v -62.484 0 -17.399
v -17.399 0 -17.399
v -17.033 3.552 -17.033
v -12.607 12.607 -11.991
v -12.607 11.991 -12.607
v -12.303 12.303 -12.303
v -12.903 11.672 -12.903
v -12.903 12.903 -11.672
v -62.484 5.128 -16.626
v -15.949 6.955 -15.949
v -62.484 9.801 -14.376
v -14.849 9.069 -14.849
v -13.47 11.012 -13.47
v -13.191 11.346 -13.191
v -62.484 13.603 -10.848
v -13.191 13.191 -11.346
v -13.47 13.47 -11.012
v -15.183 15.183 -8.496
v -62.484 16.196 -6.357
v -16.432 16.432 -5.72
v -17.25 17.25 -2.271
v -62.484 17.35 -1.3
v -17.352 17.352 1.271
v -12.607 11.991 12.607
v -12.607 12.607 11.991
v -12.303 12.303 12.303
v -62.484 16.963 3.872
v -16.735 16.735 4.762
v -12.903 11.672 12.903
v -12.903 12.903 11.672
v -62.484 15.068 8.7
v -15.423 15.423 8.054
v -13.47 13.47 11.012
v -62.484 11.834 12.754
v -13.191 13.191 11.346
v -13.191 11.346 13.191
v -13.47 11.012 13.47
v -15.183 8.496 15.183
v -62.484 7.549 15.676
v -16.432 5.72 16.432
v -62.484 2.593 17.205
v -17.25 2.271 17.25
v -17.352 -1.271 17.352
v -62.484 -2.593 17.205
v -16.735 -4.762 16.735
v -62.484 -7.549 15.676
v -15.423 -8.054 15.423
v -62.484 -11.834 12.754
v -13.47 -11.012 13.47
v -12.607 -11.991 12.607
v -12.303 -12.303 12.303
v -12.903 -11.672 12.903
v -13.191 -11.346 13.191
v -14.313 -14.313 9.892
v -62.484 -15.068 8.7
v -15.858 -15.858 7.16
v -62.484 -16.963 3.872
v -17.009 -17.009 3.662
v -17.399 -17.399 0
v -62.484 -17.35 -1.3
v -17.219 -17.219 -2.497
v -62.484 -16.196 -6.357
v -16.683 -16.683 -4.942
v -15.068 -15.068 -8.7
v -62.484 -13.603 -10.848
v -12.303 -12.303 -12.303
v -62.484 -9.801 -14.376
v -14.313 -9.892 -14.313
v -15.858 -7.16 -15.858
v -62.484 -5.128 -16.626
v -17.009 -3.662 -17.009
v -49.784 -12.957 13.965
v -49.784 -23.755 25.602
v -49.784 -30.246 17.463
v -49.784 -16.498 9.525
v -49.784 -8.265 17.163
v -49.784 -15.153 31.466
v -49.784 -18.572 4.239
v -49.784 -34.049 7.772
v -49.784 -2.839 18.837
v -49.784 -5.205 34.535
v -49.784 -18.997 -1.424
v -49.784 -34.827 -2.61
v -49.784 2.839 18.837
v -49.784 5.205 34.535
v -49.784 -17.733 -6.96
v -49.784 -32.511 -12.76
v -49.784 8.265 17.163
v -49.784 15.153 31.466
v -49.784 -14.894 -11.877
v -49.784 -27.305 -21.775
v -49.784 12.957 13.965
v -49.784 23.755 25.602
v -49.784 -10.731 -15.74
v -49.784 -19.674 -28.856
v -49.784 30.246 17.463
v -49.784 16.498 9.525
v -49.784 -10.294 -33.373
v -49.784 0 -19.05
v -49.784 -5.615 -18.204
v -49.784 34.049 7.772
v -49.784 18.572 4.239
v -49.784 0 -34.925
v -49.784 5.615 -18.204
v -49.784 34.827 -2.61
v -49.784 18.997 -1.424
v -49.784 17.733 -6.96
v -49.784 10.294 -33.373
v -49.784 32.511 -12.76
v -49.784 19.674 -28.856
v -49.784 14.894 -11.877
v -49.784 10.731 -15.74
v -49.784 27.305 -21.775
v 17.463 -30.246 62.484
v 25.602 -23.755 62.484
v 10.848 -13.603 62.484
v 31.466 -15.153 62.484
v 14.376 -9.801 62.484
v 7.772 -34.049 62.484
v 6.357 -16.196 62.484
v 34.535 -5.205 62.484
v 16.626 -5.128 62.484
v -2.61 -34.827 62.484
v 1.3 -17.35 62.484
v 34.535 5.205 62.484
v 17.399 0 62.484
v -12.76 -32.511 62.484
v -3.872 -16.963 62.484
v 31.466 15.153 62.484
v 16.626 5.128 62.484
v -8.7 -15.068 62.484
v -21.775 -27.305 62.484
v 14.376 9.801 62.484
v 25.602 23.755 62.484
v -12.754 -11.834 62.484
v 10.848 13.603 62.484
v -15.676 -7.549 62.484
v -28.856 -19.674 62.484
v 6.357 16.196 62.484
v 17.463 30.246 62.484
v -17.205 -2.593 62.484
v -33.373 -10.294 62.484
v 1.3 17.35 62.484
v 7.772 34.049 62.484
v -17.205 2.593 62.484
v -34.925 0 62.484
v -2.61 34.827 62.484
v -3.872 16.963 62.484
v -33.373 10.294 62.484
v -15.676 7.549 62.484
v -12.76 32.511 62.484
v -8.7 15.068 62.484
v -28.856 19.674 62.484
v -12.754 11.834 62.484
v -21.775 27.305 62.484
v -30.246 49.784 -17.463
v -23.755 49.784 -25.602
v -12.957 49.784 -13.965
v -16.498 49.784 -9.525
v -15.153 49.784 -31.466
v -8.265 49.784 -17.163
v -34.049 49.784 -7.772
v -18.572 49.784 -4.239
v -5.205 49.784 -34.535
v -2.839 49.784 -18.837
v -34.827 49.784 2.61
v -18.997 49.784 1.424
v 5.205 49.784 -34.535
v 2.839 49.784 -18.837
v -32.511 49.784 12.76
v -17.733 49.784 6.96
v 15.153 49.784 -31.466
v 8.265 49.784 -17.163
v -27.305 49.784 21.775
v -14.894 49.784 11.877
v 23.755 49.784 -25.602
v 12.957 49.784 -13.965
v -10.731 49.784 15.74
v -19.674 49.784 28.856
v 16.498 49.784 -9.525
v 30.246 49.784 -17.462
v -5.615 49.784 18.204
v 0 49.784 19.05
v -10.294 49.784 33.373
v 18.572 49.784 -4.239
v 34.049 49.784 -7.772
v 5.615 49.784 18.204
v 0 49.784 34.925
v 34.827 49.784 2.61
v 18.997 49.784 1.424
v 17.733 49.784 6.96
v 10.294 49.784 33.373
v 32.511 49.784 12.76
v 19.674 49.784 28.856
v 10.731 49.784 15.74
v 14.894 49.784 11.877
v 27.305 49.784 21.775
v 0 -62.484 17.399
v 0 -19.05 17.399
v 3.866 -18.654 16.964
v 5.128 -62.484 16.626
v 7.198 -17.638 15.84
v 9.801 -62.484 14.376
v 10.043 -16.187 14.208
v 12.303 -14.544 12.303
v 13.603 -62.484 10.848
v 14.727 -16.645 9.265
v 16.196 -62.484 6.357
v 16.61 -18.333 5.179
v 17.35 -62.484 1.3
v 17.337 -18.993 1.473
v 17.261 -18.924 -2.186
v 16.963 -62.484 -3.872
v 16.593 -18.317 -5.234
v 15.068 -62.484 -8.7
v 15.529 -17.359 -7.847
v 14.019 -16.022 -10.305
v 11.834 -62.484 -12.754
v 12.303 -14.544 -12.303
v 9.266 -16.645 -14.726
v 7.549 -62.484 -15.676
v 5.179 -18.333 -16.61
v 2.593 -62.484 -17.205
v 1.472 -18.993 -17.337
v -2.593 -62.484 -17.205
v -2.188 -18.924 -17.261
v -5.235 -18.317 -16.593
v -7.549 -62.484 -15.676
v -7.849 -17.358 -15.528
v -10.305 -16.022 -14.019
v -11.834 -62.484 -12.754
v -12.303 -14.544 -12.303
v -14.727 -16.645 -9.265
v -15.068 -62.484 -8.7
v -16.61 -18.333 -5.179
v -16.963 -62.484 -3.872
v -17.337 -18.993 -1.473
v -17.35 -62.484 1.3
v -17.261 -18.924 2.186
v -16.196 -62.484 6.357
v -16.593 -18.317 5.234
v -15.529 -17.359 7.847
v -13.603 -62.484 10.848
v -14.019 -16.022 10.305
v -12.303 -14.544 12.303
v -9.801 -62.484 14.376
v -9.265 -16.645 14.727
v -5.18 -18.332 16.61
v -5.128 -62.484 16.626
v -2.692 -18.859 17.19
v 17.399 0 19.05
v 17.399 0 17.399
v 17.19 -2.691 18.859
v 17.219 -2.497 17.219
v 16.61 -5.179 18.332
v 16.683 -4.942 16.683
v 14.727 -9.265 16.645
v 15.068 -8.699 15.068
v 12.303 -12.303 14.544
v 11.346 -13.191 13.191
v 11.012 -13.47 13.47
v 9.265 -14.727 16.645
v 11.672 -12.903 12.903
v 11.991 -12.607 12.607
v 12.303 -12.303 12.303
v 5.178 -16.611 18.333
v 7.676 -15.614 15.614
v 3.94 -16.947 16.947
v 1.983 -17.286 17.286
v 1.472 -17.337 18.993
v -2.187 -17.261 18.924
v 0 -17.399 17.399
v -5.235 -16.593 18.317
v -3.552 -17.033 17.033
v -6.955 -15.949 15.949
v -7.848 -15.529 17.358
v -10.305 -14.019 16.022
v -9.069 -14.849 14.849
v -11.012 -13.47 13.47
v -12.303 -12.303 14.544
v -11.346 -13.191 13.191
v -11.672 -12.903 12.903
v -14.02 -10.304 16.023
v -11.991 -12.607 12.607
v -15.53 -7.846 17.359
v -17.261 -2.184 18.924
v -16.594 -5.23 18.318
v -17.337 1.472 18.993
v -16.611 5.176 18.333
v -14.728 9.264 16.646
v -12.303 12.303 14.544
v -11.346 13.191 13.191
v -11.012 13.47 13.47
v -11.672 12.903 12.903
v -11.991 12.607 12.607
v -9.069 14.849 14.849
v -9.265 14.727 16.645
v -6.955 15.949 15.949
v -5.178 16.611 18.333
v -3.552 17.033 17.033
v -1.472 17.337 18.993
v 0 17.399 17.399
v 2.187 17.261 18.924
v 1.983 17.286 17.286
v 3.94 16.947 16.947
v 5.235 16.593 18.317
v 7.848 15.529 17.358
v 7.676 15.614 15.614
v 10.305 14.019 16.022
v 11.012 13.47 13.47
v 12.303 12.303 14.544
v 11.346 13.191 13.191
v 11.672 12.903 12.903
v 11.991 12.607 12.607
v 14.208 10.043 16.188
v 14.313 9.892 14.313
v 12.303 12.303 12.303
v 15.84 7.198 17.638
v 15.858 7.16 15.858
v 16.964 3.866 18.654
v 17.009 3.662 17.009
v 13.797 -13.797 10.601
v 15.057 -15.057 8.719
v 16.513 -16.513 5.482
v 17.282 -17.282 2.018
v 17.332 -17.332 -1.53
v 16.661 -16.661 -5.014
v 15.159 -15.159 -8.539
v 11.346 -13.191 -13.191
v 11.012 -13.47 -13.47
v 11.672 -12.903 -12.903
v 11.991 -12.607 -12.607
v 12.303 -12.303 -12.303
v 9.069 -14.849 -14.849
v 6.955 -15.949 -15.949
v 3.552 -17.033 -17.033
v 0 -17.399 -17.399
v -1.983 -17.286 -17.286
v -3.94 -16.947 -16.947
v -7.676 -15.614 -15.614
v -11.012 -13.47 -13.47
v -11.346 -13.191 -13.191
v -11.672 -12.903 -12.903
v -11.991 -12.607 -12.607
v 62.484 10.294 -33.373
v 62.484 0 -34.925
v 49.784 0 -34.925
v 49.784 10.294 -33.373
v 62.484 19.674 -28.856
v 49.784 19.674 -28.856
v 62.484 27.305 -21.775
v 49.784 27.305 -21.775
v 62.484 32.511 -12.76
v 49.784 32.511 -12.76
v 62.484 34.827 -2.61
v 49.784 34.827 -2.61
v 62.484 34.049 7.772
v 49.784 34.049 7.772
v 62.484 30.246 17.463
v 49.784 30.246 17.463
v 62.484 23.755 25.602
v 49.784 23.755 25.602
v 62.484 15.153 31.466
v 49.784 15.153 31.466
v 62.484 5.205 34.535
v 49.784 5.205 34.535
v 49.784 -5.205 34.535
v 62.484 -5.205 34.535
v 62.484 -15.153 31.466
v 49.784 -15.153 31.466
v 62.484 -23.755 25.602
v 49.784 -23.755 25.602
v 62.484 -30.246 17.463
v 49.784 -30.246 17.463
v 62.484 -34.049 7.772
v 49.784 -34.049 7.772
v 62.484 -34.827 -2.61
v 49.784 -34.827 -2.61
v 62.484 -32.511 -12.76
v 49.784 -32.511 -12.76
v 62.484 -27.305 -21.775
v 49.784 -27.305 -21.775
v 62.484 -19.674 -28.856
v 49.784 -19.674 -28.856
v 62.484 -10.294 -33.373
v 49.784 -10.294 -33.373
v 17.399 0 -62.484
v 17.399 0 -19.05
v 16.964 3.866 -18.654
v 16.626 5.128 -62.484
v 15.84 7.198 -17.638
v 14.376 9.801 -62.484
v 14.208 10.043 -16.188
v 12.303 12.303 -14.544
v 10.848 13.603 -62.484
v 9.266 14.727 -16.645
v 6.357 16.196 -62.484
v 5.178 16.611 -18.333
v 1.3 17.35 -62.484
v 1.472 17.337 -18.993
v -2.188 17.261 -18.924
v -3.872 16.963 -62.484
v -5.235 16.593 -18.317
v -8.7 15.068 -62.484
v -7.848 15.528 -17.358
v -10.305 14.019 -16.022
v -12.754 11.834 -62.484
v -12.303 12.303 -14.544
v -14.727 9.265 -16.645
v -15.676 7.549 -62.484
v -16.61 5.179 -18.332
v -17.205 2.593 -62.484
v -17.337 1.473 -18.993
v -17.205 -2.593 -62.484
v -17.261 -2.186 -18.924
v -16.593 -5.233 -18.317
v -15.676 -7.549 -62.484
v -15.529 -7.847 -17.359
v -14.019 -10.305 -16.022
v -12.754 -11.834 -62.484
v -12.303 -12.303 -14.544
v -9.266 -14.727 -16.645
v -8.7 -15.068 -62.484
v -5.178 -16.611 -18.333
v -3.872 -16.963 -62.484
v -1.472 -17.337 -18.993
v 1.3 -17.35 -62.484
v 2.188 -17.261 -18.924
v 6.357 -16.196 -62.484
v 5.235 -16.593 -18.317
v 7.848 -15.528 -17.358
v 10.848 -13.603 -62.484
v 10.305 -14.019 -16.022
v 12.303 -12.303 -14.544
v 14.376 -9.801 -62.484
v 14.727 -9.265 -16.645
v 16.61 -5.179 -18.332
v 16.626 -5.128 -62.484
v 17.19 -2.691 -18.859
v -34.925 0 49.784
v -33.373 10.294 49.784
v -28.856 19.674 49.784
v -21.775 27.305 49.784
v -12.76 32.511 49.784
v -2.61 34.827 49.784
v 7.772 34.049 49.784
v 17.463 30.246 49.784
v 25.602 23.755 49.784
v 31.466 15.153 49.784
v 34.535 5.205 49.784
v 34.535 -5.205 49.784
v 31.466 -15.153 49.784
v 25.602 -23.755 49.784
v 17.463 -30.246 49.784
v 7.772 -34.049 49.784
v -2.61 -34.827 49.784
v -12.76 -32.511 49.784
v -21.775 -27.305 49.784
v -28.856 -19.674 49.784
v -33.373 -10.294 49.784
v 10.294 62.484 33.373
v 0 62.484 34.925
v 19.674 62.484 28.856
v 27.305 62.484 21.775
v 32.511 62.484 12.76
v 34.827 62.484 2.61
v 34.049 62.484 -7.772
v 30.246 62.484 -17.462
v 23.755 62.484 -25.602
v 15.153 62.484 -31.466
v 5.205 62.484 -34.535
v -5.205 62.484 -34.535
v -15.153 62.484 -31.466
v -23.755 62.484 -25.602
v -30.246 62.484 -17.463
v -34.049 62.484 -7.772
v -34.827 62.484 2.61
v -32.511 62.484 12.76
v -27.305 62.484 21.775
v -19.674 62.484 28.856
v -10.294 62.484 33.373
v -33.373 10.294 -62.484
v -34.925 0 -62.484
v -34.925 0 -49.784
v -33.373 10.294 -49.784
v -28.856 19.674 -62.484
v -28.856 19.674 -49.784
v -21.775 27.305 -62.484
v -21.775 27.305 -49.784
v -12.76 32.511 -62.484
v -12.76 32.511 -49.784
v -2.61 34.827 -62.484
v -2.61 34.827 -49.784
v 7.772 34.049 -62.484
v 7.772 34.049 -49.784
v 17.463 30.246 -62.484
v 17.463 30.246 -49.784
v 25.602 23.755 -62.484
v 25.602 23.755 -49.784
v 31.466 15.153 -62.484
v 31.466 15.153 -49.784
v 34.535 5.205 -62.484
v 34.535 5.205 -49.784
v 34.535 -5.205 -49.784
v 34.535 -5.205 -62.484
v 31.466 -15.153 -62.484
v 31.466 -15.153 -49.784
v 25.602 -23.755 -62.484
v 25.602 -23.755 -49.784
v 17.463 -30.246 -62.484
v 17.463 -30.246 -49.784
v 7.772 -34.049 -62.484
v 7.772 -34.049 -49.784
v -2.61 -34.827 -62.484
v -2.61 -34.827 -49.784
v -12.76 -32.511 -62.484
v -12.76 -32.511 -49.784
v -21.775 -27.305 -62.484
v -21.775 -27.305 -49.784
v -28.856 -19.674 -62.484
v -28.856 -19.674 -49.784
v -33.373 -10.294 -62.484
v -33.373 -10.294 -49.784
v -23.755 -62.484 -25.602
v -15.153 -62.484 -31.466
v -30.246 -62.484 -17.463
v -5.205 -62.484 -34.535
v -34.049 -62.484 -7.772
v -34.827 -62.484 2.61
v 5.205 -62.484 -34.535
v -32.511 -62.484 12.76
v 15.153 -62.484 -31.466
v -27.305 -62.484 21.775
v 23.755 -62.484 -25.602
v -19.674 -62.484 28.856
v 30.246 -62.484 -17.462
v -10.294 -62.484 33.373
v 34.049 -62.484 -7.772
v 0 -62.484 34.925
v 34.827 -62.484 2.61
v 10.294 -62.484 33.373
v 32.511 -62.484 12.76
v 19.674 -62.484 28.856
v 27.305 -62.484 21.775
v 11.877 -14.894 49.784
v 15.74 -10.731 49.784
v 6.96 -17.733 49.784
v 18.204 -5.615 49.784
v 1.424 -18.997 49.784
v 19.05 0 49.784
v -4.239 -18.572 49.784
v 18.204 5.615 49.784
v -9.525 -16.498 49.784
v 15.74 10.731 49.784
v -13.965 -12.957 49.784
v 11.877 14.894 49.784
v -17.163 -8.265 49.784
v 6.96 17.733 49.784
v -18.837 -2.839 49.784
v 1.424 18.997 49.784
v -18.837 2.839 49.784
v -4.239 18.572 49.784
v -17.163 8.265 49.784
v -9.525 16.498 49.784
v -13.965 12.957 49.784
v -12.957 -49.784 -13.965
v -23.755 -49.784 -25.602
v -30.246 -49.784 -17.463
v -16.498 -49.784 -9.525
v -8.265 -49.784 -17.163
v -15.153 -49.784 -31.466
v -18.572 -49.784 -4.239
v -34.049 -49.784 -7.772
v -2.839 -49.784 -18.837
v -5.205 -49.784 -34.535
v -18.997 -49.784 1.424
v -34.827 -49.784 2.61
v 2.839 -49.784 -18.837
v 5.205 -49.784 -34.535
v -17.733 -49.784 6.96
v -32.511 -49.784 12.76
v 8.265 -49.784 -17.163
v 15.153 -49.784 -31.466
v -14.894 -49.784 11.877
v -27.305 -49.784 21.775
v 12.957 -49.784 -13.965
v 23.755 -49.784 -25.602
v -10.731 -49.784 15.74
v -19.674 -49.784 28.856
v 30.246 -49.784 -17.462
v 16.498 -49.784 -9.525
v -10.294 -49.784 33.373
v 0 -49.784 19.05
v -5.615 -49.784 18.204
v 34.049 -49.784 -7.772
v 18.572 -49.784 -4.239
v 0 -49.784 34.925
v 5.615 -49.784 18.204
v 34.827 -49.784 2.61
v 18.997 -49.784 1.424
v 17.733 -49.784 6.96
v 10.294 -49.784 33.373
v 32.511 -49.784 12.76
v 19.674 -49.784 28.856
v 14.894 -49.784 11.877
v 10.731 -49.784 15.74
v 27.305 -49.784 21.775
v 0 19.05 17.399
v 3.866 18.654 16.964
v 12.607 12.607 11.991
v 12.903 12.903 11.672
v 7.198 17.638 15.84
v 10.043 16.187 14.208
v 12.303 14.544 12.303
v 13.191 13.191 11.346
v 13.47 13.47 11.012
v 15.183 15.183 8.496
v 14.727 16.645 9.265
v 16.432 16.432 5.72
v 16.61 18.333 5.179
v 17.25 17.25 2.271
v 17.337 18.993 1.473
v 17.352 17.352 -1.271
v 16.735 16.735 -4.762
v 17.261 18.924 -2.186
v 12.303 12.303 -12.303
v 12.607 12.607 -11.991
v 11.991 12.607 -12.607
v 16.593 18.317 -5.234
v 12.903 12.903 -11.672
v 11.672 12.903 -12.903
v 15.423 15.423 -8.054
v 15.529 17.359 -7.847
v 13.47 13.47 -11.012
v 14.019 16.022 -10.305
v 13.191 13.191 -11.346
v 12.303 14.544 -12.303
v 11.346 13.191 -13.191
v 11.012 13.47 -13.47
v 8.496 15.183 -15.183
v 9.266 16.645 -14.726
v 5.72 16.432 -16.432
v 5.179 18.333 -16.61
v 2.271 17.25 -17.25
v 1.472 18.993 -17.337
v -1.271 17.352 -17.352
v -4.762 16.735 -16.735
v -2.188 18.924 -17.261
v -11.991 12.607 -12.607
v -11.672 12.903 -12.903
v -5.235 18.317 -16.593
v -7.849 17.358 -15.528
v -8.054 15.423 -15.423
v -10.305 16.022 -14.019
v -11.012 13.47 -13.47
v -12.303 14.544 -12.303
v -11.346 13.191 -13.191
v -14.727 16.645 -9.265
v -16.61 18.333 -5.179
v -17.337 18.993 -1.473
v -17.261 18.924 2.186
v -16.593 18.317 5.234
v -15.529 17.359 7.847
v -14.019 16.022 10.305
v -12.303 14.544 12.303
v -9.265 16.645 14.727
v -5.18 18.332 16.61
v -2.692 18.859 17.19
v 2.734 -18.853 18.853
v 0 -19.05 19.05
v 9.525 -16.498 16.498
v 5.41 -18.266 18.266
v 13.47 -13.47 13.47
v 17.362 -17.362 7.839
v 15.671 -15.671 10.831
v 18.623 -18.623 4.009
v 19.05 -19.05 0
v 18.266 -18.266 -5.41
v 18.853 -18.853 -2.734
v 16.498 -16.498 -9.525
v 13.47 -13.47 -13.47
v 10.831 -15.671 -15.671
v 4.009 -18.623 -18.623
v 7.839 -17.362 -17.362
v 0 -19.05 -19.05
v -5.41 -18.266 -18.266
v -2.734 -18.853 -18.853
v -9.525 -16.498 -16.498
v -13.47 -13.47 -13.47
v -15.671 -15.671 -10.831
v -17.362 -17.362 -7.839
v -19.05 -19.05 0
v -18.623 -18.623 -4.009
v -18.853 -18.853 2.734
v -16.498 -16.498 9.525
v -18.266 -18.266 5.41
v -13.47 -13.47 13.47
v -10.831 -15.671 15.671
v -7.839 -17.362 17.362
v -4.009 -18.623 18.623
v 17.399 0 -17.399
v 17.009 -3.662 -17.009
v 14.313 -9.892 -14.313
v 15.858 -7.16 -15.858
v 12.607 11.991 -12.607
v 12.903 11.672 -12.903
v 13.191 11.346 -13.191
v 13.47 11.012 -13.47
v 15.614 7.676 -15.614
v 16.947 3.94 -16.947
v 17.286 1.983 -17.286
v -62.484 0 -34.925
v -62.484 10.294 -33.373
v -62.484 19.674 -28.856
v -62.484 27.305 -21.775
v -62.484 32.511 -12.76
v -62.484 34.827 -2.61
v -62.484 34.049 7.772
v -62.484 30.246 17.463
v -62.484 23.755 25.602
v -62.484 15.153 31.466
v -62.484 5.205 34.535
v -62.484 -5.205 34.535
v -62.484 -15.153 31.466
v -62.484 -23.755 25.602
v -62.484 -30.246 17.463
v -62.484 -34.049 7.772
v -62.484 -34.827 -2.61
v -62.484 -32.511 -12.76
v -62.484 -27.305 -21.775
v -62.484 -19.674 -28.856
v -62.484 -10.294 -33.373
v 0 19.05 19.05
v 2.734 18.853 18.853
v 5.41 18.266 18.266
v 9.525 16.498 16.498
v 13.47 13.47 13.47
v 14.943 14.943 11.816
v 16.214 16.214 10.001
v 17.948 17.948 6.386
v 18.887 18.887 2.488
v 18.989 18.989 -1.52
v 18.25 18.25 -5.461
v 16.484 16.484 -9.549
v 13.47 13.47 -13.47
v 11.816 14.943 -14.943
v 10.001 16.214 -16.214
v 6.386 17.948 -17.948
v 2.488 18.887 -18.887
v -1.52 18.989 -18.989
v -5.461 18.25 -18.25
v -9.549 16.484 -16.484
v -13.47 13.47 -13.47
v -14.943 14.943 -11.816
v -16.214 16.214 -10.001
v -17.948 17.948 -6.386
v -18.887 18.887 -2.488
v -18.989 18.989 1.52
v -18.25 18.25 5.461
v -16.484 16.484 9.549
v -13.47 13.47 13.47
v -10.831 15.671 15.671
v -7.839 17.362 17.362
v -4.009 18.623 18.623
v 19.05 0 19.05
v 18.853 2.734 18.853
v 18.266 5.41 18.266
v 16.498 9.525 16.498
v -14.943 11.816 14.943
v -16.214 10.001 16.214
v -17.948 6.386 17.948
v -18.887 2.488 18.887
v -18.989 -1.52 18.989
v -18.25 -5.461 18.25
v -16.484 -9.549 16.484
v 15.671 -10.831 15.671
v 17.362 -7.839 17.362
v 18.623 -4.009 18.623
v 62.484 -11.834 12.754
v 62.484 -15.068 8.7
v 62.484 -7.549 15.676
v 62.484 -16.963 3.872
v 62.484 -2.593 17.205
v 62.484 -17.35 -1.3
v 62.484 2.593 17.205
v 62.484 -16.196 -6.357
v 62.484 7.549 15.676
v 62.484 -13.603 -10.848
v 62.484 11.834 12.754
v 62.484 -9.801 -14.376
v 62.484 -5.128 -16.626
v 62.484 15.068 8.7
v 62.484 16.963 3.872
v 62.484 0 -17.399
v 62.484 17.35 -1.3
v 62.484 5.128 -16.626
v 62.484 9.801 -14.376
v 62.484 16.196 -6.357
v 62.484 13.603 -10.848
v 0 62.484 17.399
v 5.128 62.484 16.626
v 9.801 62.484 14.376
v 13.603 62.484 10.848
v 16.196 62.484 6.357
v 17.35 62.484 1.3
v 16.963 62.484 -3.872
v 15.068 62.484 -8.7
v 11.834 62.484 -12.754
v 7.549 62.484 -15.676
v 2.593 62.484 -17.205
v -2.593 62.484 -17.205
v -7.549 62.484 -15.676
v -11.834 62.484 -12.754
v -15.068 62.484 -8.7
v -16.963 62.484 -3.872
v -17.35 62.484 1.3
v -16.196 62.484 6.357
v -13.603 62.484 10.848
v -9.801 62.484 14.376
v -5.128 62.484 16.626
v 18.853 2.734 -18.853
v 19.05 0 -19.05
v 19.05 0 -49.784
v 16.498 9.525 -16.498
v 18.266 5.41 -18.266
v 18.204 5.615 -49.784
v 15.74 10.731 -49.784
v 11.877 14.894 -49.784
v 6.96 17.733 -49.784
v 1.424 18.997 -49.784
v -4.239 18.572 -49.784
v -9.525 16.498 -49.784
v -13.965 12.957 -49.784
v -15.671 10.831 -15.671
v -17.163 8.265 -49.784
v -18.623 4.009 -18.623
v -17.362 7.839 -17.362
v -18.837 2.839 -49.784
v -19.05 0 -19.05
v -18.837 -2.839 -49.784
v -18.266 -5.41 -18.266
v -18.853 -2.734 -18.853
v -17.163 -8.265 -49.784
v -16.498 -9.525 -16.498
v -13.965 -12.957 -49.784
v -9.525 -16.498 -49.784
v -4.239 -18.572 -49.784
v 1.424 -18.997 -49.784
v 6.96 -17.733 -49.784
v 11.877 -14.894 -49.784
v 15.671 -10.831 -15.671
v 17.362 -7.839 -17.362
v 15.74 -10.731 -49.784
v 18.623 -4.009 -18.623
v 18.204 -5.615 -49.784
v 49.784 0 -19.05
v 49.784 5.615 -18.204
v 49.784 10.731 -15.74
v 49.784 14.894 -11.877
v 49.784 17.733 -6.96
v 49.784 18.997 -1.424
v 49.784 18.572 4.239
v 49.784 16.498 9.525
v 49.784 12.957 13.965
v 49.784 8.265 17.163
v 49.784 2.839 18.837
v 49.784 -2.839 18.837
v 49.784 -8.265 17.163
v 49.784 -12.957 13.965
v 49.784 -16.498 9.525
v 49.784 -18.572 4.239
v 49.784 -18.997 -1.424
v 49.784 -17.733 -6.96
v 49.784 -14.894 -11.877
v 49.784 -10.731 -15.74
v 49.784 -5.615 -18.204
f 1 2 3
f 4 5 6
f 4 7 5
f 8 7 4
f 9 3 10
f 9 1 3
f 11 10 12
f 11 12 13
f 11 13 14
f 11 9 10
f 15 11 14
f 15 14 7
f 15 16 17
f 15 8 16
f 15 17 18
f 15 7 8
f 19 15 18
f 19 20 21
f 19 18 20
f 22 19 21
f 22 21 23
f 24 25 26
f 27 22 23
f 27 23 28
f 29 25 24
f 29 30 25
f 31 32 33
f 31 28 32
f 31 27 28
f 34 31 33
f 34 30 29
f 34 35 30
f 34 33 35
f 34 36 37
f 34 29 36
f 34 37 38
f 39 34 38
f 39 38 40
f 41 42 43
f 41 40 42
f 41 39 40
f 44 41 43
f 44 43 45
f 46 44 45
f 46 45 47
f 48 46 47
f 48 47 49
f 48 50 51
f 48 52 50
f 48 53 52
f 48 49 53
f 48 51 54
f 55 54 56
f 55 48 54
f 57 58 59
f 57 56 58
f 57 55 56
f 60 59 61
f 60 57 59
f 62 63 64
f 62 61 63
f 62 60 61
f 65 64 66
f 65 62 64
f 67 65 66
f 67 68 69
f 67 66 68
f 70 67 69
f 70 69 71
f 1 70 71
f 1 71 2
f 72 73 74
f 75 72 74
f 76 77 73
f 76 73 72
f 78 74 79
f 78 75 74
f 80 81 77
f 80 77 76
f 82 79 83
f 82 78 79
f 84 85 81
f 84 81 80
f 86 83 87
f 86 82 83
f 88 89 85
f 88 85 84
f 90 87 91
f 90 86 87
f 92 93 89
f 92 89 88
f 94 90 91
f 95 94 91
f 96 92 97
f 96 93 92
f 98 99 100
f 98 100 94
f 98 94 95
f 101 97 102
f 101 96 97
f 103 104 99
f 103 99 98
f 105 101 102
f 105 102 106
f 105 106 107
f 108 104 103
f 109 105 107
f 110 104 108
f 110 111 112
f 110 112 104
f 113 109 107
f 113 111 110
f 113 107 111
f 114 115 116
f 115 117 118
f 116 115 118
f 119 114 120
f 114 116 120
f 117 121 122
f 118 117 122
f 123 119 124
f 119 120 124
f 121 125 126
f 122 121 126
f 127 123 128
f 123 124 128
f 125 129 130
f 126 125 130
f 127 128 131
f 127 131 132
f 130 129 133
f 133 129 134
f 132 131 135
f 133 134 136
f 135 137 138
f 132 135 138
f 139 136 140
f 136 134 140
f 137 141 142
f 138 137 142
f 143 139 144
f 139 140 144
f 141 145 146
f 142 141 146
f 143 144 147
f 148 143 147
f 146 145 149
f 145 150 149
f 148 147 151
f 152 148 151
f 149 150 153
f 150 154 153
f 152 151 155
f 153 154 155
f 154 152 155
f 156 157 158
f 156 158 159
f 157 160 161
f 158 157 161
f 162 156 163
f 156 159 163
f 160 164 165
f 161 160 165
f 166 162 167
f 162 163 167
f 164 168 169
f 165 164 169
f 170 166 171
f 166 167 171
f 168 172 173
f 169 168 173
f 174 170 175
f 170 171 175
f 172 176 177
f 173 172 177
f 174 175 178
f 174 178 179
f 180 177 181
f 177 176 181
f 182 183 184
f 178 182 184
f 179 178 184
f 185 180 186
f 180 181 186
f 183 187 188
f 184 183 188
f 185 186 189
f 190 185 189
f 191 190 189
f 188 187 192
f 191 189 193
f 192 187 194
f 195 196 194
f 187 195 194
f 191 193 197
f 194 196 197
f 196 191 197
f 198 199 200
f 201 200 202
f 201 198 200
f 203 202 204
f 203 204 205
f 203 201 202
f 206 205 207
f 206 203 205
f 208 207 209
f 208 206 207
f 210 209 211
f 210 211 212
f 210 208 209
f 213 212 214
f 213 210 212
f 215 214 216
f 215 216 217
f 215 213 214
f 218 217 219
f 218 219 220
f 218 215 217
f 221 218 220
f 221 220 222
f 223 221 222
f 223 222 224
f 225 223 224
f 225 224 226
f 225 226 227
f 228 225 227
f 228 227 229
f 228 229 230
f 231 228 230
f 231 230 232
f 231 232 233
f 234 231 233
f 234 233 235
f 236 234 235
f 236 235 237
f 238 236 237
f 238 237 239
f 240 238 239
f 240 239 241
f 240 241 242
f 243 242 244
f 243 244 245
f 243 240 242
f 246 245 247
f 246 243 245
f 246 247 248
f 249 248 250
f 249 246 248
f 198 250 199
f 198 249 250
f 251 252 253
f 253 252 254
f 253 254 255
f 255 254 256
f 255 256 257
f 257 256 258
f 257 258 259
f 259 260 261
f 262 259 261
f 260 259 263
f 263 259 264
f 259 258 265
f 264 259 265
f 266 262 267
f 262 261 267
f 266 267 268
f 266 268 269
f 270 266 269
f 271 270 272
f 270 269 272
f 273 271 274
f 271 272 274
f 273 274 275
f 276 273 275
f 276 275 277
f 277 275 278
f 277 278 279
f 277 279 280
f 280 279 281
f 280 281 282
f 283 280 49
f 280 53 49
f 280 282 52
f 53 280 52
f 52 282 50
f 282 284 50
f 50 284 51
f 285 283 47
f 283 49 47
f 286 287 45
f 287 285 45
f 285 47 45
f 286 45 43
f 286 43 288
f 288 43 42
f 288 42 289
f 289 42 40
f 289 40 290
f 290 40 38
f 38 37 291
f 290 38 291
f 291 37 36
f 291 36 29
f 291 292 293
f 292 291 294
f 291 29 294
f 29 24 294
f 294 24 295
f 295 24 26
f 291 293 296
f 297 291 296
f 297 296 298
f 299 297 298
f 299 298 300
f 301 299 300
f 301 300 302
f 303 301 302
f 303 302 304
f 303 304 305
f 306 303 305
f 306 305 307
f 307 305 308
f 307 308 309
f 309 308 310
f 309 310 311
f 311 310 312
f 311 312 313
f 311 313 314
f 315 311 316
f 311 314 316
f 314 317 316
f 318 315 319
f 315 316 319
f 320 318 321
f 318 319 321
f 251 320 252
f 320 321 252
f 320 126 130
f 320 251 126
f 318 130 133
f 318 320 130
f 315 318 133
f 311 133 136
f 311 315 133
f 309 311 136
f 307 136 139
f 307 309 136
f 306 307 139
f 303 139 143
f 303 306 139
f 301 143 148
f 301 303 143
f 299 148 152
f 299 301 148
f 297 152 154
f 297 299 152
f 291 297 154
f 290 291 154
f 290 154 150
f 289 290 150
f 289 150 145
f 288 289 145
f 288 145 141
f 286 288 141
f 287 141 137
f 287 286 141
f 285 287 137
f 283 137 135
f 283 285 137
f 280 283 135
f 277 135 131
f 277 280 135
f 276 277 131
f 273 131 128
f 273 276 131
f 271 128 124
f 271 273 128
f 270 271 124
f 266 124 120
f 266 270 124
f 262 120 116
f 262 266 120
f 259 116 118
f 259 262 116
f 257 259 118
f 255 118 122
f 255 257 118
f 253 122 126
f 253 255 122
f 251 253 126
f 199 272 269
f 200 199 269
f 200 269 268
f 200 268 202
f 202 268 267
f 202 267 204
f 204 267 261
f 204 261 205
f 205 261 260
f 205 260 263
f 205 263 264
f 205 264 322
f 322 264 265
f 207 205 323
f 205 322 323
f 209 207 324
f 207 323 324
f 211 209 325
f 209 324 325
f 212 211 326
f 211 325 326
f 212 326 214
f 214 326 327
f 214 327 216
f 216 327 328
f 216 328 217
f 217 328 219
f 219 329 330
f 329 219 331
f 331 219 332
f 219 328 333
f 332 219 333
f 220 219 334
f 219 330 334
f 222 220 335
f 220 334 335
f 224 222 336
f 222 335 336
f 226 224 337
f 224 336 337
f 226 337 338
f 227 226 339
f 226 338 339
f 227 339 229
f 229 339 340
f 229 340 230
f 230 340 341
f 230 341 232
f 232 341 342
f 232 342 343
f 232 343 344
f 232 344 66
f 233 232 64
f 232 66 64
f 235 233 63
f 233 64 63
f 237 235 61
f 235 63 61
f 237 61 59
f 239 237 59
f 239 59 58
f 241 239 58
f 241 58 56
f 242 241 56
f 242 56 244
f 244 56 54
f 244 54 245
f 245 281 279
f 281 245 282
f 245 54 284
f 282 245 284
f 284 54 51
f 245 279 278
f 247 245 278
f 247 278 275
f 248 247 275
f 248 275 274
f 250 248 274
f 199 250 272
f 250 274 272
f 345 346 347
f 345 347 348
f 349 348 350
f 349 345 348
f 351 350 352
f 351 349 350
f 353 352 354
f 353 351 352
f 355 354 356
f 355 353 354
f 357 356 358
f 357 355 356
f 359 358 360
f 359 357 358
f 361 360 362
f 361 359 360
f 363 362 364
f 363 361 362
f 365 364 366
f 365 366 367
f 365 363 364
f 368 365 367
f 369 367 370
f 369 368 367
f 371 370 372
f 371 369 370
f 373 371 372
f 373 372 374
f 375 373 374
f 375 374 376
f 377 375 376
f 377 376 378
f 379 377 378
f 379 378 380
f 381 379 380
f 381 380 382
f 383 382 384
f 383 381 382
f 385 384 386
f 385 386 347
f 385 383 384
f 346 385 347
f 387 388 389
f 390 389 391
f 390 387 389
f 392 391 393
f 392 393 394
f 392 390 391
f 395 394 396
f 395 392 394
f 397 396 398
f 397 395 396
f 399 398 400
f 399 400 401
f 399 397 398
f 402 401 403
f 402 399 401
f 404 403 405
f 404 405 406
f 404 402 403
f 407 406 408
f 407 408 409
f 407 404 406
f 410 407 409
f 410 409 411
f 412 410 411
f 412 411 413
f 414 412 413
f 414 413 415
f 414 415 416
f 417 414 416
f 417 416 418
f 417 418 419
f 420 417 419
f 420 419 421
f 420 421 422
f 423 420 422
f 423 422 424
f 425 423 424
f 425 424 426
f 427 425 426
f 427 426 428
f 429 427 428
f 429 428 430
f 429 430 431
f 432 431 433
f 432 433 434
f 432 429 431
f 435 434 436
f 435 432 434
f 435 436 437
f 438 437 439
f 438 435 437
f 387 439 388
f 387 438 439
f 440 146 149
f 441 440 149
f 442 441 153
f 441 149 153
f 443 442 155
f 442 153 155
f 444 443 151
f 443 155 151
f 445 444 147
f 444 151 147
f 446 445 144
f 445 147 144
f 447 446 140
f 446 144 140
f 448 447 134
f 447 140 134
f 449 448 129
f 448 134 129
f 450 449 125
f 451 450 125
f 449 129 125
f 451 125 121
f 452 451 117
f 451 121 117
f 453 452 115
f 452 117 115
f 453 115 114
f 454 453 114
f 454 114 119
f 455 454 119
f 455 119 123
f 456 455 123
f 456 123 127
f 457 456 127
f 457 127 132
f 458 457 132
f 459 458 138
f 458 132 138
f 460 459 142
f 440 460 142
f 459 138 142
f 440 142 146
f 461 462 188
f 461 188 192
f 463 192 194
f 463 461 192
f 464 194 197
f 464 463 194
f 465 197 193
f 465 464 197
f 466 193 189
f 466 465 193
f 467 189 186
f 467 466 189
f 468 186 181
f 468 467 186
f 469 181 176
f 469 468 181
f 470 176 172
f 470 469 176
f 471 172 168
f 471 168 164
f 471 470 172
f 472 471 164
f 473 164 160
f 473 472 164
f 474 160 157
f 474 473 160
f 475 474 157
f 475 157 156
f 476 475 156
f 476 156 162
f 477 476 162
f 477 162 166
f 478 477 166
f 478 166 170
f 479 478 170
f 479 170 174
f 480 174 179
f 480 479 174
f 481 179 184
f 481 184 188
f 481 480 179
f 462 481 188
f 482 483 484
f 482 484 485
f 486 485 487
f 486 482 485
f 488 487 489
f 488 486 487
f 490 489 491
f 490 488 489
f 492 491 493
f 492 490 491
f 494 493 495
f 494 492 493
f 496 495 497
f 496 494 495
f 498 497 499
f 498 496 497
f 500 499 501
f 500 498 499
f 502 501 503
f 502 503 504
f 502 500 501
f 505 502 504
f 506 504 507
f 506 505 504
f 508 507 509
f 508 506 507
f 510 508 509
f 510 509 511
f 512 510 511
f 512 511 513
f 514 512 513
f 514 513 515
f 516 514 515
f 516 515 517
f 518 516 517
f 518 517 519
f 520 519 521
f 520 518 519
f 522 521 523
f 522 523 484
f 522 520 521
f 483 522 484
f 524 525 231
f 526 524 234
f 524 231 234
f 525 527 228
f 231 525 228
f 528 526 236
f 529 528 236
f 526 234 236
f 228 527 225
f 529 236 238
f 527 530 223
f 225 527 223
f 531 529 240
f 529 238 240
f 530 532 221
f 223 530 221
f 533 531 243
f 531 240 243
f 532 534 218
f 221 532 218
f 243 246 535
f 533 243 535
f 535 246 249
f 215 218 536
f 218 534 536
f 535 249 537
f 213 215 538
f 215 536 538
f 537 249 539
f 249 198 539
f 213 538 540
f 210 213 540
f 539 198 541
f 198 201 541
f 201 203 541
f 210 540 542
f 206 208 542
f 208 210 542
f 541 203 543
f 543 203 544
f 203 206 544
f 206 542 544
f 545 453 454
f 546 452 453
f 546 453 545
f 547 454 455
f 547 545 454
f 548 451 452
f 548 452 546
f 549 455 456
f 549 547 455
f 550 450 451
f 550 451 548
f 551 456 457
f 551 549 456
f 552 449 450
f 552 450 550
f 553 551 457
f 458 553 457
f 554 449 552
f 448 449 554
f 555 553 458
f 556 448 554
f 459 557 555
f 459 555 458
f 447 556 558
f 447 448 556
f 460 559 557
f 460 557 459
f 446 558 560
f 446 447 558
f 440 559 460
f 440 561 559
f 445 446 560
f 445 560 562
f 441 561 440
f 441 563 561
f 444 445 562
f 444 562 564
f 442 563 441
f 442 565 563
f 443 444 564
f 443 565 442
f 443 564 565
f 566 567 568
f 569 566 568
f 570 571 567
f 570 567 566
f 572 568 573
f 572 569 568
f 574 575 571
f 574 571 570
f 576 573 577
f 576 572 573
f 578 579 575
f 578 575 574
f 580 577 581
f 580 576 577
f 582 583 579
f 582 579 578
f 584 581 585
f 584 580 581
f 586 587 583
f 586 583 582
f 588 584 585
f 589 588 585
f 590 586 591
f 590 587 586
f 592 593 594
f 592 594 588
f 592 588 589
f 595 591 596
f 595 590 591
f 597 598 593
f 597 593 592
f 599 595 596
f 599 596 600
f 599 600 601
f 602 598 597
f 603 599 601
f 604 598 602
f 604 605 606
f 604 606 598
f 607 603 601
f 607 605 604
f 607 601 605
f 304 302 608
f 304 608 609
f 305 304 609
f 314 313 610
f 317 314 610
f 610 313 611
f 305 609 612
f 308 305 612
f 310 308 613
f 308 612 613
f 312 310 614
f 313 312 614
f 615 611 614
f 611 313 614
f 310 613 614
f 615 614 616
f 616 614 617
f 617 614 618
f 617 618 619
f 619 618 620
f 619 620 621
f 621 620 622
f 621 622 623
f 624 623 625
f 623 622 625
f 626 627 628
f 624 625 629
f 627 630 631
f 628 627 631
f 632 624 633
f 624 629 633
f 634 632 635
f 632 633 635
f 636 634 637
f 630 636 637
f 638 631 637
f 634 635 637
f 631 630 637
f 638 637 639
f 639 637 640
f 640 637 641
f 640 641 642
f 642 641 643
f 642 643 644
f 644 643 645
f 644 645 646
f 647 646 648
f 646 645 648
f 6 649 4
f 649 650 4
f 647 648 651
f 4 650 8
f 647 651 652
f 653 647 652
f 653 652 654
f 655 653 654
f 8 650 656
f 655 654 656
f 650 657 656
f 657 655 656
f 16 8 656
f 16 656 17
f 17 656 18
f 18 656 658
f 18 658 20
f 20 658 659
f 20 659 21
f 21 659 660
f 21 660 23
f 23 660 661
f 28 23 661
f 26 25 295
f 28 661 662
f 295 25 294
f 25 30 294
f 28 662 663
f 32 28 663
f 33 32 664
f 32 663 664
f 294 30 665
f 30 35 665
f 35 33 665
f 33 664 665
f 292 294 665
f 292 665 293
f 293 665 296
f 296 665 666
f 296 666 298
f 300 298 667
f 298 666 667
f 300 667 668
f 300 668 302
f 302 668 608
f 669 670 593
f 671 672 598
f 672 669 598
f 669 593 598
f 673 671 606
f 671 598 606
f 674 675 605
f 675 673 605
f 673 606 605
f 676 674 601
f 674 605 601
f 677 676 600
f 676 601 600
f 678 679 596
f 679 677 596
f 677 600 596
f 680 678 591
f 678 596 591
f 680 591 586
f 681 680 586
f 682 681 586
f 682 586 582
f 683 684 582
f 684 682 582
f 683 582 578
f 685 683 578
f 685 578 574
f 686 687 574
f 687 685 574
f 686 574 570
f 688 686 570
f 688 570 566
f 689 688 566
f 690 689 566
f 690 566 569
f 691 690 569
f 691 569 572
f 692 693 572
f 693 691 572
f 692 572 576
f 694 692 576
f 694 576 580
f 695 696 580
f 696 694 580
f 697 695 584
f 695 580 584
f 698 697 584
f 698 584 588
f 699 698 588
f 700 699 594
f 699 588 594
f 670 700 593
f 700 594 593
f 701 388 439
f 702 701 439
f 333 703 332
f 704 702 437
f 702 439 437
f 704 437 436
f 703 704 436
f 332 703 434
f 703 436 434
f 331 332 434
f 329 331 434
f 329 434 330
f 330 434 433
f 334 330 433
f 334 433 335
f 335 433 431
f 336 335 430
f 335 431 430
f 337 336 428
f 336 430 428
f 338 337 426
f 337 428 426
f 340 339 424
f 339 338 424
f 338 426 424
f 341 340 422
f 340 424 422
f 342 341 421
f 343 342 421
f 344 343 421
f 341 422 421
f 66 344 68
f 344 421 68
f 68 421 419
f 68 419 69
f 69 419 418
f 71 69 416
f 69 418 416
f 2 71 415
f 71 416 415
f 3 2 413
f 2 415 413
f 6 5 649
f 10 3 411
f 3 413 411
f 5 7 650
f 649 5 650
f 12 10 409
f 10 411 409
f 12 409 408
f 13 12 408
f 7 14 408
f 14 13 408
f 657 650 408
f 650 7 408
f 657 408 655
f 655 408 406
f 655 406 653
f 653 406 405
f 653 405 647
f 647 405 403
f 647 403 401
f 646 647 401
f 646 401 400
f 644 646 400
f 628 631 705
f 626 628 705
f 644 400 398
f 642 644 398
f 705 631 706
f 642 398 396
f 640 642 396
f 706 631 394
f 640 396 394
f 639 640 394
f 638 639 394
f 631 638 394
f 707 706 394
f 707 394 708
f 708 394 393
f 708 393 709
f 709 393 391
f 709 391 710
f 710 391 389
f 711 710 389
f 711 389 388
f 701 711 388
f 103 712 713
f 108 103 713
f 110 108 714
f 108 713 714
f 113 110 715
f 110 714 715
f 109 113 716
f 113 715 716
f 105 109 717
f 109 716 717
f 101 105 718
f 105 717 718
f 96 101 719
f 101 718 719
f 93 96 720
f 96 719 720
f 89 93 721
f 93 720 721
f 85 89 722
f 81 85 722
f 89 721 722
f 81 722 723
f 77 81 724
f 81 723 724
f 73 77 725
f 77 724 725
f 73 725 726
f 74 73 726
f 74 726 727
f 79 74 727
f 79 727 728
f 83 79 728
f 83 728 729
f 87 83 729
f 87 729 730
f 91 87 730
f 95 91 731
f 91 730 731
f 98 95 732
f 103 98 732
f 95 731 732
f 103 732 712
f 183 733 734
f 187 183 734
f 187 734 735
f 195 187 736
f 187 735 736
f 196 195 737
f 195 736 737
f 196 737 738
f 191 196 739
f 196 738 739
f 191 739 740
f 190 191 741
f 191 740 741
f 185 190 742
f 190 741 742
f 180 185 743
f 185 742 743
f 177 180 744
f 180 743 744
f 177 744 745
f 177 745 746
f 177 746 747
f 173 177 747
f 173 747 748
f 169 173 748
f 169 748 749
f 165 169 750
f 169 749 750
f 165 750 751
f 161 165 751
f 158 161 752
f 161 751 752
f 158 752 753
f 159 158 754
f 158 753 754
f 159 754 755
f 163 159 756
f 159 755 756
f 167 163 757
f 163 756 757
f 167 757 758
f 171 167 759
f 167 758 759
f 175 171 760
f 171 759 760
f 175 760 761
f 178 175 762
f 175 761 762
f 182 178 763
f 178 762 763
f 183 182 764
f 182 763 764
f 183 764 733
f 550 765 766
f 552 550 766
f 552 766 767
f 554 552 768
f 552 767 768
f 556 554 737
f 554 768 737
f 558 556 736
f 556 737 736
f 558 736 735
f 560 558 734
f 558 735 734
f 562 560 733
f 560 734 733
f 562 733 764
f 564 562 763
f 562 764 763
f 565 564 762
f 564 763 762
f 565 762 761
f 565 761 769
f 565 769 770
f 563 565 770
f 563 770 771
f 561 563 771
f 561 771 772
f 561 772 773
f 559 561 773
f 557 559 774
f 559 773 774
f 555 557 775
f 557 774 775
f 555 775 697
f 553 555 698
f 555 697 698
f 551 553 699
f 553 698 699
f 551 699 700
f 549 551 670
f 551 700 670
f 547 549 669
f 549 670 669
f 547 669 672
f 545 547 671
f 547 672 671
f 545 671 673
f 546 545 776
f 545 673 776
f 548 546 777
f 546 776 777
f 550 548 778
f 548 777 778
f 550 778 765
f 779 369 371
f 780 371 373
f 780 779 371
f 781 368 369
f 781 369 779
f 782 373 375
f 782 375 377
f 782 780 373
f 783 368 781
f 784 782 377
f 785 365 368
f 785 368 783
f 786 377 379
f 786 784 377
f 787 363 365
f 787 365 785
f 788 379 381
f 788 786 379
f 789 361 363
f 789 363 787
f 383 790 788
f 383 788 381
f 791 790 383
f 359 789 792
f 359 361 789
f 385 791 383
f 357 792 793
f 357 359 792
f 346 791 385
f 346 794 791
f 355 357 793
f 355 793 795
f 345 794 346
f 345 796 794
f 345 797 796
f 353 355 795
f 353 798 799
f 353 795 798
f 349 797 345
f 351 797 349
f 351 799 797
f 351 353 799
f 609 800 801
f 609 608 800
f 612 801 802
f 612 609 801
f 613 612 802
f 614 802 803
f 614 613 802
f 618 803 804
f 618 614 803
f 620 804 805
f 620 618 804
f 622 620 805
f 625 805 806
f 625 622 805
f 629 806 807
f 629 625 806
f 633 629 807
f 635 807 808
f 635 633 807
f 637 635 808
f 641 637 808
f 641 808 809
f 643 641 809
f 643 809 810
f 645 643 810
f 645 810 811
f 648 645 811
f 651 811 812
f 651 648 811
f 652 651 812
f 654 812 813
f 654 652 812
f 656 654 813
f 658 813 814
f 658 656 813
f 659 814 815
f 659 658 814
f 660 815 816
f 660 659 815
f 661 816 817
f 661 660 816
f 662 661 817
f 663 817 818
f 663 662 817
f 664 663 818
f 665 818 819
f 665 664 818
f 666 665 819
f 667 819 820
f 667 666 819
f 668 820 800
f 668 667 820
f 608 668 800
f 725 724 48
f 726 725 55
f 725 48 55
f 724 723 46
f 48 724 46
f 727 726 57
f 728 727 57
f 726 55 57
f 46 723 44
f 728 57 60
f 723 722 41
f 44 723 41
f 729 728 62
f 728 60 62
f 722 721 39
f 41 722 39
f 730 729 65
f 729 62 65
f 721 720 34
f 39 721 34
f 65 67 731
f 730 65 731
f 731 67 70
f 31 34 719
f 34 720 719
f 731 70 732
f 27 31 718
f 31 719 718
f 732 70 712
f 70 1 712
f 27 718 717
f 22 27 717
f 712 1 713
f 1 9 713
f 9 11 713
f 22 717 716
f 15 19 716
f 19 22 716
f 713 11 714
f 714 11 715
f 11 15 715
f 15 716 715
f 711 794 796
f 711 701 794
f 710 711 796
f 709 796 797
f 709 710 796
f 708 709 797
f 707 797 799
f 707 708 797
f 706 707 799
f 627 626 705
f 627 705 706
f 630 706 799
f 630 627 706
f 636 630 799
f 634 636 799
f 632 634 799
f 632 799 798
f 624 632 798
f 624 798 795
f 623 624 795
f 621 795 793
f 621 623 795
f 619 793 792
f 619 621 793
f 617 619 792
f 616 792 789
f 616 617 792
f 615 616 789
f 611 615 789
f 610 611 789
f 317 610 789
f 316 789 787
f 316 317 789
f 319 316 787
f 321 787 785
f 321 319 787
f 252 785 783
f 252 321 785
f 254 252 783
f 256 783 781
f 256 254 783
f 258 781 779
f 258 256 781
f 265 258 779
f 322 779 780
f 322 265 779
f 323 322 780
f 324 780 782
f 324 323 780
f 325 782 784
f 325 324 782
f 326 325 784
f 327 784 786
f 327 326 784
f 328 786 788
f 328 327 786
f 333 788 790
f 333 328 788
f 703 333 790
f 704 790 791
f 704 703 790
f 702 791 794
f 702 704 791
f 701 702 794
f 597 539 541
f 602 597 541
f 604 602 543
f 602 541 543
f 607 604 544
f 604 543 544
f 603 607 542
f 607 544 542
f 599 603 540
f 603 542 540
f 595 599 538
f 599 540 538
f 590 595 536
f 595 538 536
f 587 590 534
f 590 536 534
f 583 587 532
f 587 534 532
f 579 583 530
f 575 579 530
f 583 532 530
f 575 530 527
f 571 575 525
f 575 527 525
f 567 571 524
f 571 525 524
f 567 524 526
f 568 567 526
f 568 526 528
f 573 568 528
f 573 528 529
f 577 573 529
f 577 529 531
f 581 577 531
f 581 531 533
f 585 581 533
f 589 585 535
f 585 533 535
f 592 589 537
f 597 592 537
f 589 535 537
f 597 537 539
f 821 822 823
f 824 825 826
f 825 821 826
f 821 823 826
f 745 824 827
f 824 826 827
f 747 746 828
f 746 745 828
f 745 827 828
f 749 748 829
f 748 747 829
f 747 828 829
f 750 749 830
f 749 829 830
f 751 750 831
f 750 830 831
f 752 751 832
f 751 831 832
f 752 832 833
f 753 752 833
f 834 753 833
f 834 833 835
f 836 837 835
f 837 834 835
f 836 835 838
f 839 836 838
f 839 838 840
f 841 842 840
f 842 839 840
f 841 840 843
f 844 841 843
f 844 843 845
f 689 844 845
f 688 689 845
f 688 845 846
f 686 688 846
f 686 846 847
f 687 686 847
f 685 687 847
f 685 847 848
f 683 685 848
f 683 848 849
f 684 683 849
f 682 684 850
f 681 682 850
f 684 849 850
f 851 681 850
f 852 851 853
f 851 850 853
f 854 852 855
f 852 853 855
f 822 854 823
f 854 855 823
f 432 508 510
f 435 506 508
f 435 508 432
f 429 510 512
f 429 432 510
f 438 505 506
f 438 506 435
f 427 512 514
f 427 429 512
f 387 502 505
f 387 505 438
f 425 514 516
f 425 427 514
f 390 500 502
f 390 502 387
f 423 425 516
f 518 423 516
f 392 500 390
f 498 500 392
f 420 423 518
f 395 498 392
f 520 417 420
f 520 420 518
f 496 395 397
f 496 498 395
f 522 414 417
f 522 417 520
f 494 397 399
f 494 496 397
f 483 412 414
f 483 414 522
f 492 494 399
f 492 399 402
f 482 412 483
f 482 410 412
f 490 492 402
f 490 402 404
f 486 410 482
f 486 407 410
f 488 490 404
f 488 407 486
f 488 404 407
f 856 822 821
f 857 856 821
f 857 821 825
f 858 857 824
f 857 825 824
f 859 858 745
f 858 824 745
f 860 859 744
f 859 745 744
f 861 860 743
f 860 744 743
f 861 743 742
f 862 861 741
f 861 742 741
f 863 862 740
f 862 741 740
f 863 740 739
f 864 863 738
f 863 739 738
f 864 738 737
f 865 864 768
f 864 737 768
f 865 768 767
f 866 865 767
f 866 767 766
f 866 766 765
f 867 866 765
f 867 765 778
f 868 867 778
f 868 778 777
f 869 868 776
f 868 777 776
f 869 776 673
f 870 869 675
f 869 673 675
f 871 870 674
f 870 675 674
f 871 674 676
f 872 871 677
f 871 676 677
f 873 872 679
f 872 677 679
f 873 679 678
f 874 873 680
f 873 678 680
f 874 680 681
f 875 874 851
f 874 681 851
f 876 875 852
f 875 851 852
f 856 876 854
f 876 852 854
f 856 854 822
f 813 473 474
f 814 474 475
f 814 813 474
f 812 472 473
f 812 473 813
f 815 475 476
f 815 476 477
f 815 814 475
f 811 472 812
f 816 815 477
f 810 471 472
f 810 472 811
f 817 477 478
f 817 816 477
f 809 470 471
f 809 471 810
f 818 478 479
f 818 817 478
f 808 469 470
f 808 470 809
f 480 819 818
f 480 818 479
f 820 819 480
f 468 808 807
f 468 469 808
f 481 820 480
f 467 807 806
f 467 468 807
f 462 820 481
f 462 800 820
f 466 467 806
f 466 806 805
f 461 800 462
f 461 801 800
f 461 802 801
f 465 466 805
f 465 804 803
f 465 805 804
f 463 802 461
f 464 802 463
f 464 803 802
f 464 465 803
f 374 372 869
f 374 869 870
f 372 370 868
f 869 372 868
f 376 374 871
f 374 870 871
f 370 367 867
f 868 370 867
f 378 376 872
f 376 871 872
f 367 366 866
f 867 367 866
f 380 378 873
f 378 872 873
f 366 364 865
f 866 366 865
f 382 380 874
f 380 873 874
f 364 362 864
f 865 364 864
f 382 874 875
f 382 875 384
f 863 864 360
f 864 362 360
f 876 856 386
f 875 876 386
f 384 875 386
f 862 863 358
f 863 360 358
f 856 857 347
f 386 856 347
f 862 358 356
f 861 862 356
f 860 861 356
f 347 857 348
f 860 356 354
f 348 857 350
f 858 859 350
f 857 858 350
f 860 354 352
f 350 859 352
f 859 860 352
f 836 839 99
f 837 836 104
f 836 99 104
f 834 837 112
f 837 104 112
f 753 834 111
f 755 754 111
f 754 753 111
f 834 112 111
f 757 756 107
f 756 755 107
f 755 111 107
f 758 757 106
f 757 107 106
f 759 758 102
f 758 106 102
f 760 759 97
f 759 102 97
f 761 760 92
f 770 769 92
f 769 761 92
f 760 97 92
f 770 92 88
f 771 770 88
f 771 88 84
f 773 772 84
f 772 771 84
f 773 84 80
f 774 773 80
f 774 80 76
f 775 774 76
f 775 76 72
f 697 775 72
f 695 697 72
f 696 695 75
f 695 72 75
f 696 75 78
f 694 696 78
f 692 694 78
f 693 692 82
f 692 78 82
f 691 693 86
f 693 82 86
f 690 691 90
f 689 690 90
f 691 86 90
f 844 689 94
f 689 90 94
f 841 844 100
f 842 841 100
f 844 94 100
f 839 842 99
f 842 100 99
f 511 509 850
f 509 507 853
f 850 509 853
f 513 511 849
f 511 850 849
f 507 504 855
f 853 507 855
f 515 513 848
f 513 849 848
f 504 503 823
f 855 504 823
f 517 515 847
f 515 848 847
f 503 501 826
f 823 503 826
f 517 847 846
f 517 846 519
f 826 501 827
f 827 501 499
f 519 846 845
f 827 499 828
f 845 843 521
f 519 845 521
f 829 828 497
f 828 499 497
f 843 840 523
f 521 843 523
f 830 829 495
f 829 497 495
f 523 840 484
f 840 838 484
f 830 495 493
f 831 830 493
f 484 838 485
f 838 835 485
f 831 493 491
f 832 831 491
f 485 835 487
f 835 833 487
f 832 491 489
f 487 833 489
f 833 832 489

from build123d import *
from build123d.topology import SkipClean

# Parameters (mm, degrees)
EXTRUDE1_DEPTH      = 62.484
EXTRUDE1_DEPTH_BACK = 62.484
SKETCH1_R           = 19.05
SKETCH1_R_2         = 17.399
EXTRUDE2_DEPTH      = 62.484
EXTRUDE2_DEPTH_BACK = 62.484
SKETCH2_R           = 19.05
SKETCH2_R_2         = 17.399
EXTRUDE3_DEPTH      = 62.484
EXTRUDE3_DEPTH_BACK = 62.484
SKETCH3_R           = 19.05
SKETCH3_R_2         = 17.399
EXTRUDE4_START      = -81.534000101
EXTRUDE4_OUTLINE_R  = 17.399
EXTRUDE4_DEPTH      = 38.100000201
SKETCH5_R           = 17.399
EXTRUDE5_DEPTH      = 154.053917211
SKETCH6_R           = 17.399
EXTRUDE6_DEPTH      = 154.053917211
SKETCH7_R           = 34.925
SKETCH7_R_2         = 17.399
EXTRUDE7_DEPTH      = 12.7
SKETCH8_R           = 34.925
SKETCH8_R_2         = 17.399
EXTRUDE8_DEPTH      = 12.7
SKETCH9_R           = 34.925
SKETCH9_R_2         = 17.399
EXTRUDE9_DEPTH      = 12.7


# Read off the part's stored shape, not the designer's step: Extrude4
with BuildPart() as part:
    # Sketch1 → Extrude1 (new, two sides: drawn at the far end of the back side and taken through both)
    with BuildSketch(Plane(origin=(0, 0, 0), x_dir=(1, 0, 0), z_dir=(0, 1, 0)).offset(-EXTRUDE1_DEPTH_BACK)):
        with Locations(Location((0, 0, 0), (0, 0, 270))):
            Circle(SKETCH1_R)
        with Locations(Location((0, 0, 0), (0, 0, 270))):
            Circle(SKETCH1_R_2, mode=Mode.SUBTRACT)
    extrude(amount=EXTRUDE1_DEPTH + EXTRUDE1_DEPTH_BACK)

    # Sketch2 → Extrude2 (add, two sides: drawn at the far end of the back side and taken through both)
    with BuildSketch(Plane.XY.offset(-EXTRUDE2_DEPTH_BACK)):
        Circle(SKETCH2_R)
        Circle(SKETCH2_R_2, mode=Mode.SUBTRACT)
    extrude(amount=EXTRUDE2_DEPTH + EXTRUDE2_DEPTH_BACK)

    # Sketch3 → Extrude3 (add, two sides: drawn at the far end of the back side and taken through both)
    with BuildSketch(Plane(origin=(0, 0, 0), x_dir=(0, 0, -1), z_dir=(1, 0, 0)).offset(-EXTRUDE3_DEPTH_BACK)):
        Circle(SKETCH3_R)
        Circle(SKETCH3_R_2, mode=Mode.SUBTRACT)
    extrude(amount=EXTRUDE3_DEPTH + EXTRUDE3_DEPTH_BACK)

    # Extrude4 outline → Extrude4 (cut)
    with BuildSketch(Plane(origin=(62.484, 0, 0), x_dir=(0, 0, -1), z_dir=(1, 0, 0)).offset(EXTRUDE4_START)):
        Circle(EXTRUDE4_OUTLINE_R)
    extrude(amount=EXTRUDE4_DEPTH, mode=Mode.SUBTRACT)

    # Sketch5 → Extrude5 (cut, through all)
    with SkipClean():  # the faces are left unmerged after this step: merging them gives an invalid solid
        with BuildSketch(Plane(origin=(0, 0, -62.484), x_dir=(-1, 0, 0), z_dir=(0, 0, -1))):
            with Locations(Location((0, 0, 0), (0, 0, 180))):
                Circle(SKETCH5_R)
        extrude(amount=-EXTRUDE5_DEPTH, mode=Mode.SUBTRACT)

    # Sketch6 → Extrude6 (cut, through all)
    with BuildSketch(Plane(origin=(0, 62.484, 0), x_dir=(1, 0, 0), z_dir=(0, 1, 0))):
        with Locations(Location((0, 0, 0), (0, 0, 270))):
            Circle(SKETCH6_R)
    extrude(amount=-EXTRUDE6_DEPTH, mode=Mode.SUBTRACT)

    # Sketch7 → Extrude7 (add)
    with BuildSketch(Plane(origin=(62.484, 0, 0), x_dir=(0, 0, -1), z_dir=(1, 0, 0))):
        Circle(SKETCH7_R)
        Circle(SKETCH7_R_2, mode=Mode.SUBTRACT)
    extrude7 = extrude(amount=-EXTRUDE7_DEPTH)

    # Mirror1: Extrude7 across plane
    add(extrude7.mirror(Plane(origin=(0, 0, 0), x_dir=(0, 0, 1), z_dir=(1, 0, 0))))

    # Sketch8 → Extrude8 (add)
    with BuildSketch(Plane(origin=(0, 0, -62.484), x_dir=(-1, 0, 0), z_dir=(0, 0, -1))):
        Circle(SKETCH8_R)
        with Locations(Location((0, 0, 0), (0, 0, 180))):
            Circle(SKETCH8_R_2, mode=Mode.SUBTRACT)
    extrude8 = extrude(amount=-EXTRUDE8_DEPTH)

    # Mirror2: Extrude8 across plane
    add(extrude8.mirror(Plane.XY))

    # Sketch9 → Extrude9 (add)
    with BuildSketch(Plane(origin=(0, 62.484, 0), x_dir=(1, 0, 0), z_dir=(0, 1, 0))):
        with Locations(Location((0, 0, 0), (0, 0, 270))):
            Circle(SKETCH9_R)
        with Locations(Location((0, 0, 0), (0, 0, 270))):
            Circle(SKETCH9_R_2, mode=Mode.SUBTRACT)
    extrude9 = extrude(amount=-EXTRUDE9_DEPTH)

    # Mirror3: Extrude9 across plane
    add(extrude9.mirror(Plane.ZX))


solid = part.part
